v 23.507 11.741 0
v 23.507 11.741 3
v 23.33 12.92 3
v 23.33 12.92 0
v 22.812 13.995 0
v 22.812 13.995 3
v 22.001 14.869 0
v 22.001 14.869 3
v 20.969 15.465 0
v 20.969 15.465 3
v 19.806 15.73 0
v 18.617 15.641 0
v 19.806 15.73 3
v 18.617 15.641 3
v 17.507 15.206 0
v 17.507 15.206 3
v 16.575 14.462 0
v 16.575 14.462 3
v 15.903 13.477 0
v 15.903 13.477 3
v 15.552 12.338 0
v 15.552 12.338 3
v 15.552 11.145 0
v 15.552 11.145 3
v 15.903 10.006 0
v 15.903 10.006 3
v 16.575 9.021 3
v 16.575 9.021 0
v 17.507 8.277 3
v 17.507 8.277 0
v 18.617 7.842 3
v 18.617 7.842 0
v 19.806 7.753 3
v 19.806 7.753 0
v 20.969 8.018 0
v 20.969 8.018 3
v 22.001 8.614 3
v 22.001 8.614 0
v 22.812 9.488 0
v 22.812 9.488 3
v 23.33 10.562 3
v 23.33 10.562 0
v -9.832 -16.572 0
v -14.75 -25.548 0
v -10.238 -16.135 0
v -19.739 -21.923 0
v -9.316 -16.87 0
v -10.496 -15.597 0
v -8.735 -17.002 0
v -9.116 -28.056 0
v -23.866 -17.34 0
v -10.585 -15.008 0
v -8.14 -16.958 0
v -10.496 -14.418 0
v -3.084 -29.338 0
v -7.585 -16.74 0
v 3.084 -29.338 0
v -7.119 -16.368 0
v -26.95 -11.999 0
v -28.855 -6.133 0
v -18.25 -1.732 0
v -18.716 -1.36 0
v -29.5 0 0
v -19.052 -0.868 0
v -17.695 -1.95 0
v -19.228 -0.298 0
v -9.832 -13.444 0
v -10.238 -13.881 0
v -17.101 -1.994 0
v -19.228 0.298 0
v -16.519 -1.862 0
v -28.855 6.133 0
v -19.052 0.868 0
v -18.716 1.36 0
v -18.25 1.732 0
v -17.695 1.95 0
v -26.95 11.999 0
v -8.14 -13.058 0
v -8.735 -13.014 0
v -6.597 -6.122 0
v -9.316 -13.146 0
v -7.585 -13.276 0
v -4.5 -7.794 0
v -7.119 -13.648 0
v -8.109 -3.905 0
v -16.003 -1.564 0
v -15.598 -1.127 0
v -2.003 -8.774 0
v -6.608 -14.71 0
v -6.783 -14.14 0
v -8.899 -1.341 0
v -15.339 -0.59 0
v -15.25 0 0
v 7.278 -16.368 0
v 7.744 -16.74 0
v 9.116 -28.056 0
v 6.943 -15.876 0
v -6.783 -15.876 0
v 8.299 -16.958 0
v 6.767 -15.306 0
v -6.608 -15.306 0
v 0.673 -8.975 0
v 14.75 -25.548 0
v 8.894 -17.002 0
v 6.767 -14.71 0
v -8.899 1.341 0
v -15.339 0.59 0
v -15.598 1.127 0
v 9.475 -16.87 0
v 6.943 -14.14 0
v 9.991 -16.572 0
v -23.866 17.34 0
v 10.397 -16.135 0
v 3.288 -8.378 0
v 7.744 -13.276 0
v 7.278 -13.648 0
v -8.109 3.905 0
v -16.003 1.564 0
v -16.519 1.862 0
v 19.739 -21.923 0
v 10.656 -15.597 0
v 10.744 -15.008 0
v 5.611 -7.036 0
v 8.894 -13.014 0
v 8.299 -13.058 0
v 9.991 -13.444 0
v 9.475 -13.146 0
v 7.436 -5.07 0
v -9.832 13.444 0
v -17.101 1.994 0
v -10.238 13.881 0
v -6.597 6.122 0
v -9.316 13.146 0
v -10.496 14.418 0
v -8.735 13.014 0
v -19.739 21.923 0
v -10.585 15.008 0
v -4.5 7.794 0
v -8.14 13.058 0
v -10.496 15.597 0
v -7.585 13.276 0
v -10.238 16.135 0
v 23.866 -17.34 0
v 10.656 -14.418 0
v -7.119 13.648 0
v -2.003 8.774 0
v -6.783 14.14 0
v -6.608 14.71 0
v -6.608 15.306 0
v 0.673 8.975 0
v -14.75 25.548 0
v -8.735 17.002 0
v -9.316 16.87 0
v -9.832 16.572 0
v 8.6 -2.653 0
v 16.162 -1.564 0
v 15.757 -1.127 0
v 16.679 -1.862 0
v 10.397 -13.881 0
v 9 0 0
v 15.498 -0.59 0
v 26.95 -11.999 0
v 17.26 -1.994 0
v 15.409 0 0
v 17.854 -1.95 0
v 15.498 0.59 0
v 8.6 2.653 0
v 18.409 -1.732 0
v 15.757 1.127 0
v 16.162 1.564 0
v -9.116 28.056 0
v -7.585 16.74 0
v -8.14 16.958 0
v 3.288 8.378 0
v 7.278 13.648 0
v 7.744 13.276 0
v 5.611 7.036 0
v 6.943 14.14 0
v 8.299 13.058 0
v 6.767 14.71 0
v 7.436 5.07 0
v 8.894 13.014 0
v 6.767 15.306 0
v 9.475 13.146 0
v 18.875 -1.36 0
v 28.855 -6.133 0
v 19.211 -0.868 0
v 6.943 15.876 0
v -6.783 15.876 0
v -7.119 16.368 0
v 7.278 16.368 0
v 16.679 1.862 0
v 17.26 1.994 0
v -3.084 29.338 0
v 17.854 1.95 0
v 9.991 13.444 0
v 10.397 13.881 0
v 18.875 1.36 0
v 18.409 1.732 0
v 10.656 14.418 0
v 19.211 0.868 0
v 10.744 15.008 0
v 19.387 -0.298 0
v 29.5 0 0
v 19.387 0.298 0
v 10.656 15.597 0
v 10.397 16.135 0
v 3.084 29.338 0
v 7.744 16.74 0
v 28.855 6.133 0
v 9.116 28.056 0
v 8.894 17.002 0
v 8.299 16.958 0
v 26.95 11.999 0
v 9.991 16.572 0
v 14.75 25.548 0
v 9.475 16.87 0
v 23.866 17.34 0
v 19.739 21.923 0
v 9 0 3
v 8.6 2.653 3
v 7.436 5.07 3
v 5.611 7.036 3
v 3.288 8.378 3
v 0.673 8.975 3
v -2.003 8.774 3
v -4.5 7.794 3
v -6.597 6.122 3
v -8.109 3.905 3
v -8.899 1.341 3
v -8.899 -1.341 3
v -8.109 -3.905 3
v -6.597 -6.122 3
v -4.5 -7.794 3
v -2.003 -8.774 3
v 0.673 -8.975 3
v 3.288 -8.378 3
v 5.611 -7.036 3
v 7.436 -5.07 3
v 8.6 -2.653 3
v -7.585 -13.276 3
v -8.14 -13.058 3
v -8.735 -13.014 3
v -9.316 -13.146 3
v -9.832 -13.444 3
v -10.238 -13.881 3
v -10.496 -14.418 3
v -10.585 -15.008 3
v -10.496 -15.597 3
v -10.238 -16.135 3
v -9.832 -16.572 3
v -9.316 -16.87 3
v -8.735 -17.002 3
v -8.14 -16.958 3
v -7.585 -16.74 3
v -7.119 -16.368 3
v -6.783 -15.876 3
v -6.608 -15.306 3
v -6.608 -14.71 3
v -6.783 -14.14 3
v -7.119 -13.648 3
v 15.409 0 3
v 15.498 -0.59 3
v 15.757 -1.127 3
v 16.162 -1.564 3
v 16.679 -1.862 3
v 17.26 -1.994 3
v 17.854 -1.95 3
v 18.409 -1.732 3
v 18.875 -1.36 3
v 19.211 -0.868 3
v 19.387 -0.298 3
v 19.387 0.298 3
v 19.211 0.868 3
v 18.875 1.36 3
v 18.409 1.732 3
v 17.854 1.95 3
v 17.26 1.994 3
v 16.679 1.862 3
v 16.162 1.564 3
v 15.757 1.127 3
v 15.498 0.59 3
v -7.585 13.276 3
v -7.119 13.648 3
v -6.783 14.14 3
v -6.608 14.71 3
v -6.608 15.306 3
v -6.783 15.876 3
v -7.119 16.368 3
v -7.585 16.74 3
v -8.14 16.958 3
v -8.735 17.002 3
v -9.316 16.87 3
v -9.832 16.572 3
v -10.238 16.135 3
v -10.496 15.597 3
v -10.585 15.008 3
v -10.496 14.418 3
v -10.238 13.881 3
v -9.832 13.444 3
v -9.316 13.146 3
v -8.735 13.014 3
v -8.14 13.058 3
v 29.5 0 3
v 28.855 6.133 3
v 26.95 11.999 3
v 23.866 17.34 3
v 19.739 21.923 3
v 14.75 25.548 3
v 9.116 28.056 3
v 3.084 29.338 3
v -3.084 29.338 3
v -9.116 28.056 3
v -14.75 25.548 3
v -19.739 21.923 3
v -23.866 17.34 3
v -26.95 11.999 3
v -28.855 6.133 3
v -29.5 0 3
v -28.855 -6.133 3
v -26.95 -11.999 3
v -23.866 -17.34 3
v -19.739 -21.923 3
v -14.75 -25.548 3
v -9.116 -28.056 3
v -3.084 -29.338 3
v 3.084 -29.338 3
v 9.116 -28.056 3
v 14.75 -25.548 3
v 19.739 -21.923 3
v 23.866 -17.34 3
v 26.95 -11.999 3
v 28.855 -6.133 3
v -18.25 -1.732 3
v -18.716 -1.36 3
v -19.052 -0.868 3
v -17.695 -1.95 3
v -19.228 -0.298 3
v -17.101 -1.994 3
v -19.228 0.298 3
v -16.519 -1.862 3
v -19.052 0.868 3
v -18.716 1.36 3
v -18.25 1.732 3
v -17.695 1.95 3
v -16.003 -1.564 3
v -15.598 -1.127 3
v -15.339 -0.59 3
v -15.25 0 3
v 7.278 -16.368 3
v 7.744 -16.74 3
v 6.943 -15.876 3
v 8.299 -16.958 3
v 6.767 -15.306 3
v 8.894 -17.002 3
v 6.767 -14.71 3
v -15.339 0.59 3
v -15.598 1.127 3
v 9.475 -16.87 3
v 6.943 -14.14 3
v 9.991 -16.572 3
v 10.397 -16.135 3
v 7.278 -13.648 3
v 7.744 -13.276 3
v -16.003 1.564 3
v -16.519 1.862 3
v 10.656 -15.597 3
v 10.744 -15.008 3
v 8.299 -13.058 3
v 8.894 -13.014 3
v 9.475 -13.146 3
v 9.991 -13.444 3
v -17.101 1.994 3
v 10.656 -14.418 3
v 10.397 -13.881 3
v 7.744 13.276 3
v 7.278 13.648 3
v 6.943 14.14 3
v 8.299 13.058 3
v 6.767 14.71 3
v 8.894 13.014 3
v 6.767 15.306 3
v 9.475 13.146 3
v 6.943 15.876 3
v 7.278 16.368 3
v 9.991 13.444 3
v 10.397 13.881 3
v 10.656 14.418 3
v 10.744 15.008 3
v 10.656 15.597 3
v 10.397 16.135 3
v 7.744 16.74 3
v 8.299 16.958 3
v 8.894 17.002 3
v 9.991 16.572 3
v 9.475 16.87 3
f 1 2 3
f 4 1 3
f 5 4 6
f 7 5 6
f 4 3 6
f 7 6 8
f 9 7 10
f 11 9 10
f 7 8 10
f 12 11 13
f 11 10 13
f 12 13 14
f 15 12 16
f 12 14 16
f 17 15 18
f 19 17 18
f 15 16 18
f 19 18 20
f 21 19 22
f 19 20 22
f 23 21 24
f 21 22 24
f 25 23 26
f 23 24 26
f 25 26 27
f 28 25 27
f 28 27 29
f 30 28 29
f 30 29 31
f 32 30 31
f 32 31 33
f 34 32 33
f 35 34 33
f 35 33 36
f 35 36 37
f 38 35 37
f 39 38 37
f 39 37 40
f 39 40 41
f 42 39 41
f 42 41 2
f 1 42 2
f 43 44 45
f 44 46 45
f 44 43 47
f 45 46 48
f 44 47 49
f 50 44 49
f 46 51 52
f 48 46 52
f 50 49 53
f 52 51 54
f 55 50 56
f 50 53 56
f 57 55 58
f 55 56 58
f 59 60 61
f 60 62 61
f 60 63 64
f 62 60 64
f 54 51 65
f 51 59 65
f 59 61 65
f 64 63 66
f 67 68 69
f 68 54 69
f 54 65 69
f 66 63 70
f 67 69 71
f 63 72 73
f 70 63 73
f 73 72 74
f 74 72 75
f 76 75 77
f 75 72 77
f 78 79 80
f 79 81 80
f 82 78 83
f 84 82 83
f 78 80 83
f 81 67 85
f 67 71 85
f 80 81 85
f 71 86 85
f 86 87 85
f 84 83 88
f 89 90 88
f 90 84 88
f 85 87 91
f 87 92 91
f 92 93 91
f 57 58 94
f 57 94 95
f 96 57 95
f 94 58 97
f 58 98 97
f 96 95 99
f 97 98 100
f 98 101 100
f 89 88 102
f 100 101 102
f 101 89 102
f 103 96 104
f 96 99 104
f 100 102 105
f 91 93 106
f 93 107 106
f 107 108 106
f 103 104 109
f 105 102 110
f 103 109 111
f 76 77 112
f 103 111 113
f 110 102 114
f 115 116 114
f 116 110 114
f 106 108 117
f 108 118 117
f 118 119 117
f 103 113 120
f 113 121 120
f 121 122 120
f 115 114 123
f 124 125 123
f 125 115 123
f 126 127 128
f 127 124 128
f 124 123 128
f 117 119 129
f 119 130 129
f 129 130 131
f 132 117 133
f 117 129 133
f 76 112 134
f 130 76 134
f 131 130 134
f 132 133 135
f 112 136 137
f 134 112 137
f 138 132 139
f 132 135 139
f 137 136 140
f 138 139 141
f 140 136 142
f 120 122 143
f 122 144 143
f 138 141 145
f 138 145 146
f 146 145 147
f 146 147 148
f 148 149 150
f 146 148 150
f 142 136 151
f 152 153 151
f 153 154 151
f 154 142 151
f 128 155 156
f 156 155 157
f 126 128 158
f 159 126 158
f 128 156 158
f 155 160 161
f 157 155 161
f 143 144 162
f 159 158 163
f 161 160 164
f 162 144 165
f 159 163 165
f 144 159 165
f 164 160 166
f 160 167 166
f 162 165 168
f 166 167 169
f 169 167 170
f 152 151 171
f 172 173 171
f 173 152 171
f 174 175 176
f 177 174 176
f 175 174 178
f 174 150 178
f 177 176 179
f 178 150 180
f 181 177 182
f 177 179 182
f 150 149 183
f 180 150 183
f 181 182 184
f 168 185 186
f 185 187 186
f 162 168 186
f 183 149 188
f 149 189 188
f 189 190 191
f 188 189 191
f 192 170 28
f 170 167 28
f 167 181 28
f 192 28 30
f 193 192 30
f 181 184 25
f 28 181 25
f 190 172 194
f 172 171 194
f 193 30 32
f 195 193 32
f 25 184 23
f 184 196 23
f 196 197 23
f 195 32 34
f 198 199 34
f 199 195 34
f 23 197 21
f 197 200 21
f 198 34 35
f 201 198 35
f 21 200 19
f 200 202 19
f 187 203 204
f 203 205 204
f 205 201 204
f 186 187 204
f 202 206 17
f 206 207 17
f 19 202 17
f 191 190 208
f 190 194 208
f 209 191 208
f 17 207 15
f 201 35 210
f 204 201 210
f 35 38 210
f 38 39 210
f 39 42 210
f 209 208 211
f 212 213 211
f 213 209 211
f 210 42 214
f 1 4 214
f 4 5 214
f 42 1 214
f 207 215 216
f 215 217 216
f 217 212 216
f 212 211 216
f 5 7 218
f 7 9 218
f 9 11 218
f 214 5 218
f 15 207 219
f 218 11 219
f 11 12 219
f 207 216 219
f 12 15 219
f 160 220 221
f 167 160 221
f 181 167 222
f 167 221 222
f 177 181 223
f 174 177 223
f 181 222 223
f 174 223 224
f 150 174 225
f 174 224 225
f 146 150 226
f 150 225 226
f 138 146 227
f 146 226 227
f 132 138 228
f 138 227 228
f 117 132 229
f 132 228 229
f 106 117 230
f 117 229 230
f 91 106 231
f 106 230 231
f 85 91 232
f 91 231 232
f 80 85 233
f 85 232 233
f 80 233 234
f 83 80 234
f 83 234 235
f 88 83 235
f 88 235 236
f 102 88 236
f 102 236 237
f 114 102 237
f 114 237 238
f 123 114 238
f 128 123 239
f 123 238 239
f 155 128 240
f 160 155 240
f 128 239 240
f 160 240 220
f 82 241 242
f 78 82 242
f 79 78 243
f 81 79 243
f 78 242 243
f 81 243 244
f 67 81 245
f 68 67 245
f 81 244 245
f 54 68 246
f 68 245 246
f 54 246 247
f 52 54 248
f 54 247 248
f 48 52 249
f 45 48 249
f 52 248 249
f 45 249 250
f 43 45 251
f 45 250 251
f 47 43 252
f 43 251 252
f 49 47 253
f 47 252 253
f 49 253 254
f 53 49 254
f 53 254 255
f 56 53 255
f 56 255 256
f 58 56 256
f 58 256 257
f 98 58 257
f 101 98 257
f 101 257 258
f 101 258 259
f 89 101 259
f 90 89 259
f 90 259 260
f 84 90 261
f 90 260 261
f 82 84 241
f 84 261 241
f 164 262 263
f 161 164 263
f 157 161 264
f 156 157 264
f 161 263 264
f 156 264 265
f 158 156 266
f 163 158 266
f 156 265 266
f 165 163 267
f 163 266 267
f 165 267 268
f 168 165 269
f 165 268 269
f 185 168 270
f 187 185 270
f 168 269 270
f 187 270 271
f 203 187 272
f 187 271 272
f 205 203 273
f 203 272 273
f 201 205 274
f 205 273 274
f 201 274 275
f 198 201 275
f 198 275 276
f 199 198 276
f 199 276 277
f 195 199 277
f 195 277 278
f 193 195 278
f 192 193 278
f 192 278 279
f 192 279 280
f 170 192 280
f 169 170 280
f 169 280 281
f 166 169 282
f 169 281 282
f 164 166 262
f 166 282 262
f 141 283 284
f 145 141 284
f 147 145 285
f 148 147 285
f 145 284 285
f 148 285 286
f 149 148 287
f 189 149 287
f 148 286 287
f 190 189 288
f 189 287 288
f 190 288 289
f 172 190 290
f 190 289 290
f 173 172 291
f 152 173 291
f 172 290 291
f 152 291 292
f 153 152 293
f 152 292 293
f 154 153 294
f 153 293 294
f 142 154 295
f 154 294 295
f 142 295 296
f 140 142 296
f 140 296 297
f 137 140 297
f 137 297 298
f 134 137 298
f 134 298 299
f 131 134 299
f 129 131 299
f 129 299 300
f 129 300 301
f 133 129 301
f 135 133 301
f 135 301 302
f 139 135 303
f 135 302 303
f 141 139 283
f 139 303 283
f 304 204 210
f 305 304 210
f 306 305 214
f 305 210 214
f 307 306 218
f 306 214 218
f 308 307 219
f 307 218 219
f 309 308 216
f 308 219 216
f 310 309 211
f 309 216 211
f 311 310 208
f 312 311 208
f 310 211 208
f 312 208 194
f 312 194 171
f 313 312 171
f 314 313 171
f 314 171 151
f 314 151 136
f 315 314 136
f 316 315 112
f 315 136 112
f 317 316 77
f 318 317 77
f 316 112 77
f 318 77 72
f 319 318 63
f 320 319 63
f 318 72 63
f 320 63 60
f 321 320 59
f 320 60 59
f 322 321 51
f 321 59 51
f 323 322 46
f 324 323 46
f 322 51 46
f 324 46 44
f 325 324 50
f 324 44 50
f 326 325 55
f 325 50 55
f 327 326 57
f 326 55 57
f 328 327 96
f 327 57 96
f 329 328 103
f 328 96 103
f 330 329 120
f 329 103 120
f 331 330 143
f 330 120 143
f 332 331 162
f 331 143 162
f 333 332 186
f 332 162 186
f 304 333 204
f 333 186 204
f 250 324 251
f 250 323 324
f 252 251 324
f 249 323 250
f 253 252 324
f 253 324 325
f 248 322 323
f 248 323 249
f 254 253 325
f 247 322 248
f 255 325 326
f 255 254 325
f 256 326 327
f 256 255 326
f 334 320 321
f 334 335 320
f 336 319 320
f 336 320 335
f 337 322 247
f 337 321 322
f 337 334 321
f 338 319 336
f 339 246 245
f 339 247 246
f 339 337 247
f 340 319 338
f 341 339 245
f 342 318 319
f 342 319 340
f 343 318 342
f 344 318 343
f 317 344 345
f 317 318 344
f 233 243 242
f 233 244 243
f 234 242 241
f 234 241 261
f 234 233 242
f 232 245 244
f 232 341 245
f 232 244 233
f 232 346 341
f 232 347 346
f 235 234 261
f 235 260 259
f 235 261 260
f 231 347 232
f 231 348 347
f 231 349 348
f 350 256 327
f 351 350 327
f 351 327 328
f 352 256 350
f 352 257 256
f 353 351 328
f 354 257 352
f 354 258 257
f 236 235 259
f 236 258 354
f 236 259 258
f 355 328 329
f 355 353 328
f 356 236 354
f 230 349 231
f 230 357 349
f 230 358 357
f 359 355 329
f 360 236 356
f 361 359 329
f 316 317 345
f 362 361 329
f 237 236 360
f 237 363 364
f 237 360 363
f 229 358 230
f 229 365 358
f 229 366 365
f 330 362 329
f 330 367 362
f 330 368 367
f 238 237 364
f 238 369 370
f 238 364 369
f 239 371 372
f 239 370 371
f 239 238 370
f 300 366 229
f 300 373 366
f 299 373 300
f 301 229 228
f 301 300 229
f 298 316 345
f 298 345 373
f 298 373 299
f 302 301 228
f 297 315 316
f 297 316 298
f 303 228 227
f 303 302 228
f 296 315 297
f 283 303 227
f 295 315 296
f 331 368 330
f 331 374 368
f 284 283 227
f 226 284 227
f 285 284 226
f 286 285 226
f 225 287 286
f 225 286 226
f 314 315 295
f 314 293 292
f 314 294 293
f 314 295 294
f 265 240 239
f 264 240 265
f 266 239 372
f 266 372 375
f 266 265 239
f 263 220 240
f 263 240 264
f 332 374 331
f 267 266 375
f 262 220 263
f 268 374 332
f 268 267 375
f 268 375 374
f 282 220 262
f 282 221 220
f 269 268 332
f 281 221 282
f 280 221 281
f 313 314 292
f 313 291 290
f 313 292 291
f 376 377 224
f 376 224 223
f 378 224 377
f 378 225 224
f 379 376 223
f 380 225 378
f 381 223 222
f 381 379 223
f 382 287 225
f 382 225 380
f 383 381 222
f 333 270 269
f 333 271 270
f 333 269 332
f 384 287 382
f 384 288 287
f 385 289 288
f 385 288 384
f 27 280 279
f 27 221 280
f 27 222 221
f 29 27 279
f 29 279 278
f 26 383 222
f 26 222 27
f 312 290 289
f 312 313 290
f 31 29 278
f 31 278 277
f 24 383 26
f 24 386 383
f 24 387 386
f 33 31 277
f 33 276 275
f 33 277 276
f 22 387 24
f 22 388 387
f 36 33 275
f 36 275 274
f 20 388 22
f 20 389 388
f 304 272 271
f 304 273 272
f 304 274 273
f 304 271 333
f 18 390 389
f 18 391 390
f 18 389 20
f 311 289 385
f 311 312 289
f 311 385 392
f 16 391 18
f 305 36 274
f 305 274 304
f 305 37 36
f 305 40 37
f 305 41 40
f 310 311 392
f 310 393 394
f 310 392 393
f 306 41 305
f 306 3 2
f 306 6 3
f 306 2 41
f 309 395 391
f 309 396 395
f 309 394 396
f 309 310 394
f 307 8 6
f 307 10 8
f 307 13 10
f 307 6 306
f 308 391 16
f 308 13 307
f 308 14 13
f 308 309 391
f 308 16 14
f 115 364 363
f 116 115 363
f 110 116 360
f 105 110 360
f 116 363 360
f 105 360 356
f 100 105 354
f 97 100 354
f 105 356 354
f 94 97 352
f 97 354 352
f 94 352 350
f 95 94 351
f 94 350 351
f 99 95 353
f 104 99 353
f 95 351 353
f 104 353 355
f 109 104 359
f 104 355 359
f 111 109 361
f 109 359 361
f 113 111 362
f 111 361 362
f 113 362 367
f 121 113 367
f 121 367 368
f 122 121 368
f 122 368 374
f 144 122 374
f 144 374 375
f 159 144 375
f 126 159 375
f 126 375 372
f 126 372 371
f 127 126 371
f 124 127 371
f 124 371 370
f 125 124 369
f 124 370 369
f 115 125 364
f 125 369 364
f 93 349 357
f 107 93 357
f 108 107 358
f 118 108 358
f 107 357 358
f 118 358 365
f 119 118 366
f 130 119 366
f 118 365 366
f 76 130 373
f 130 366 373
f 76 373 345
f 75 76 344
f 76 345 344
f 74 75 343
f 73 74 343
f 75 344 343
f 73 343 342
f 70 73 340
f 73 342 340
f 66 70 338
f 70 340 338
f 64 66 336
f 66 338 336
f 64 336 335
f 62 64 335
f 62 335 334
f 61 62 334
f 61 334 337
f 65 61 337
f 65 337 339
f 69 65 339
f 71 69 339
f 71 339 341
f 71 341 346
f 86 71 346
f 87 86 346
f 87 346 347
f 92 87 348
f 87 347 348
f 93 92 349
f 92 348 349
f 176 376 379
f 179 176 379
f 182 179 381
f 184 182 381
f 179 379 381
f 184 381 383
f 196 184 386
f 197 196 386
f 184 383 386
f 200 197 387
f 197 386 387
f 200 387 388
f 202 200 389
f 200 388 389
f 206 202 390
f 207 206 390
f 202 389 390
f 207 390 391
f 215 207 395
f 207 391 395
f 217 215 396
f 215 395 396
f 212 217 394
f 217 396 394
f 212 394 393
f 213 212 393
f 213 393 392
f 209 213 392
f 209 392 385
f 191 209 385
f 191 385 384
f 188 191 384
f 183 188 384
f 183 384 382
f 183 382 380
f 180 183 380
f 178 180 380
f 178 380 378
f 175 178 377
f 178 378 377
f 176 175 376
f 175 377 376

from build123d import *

# Parameters (mm, degrees)
SKETCH_2_R               = 29.5
EXTRUDE_1_DEPTH          = 3
SKETCH_3_R               = 2
CUT_EXTRUDE_1_DEPTH      = 3
PATTERN_CIRCULAR_1_COUNT = 6
SKETCH_4_R               = 9
CUT_EXTRUDE_2_DEPTH      = 3
SKETCH_5_R               = 4
CUT_EXTRUDE_3_DEPTH      = 10


with BuildPart() as part:
    # 草图2 → 凸台-拉伸1 (new body)
    with BuildSketch(Plane.XY):
        Circle(SKETCH_2_R)
    extrude(amount=EXTRUDE_1_DEPTH)

    # 草图3 → 切除-拉伸1 (cut)
    with BuildSketch(Plane.XY.offset(3)):
        with Locations((-17.25, 0)):
            Circle(SKETCH_3_R)
    cut_extrude_1 = extrude(amount=-CUT_EXTRUDE_1_DEPTH, mode=Mode.SUBTRACT)

    # 阵列(圆周)1: 切除-拉伸1 ×6 about axis
    pattern_circular_1_axis = Axis((0.07965368, 0, 0), (0, 0, 1))
    for i in range(1, PATTERN_CIRCULAR_1_COUNT):
        add(cut_extrude_1.rotate(pattern_circular_1_axis, i * 360 / PATTERN_CIRCULAR_1_COUNT), mode=Mode.SUBTRACT)

    # 草图4 → 切除-拉伸2 (cut)
    with BuildSketch(Plane.XY.offset(3)):
        Circle(SKETCH_4_R)
    extrude(amount=-CUT_EXTRUDE_2_DEPTH, mode=Mode.SUBTRACT)

    # 草图5 → 切除-拉伸3 (cut)
    with BuildSketch(Plane.XY.offset(3)):
        with Locations((19.507246774, 11.74145424)):
            Circle(SKETCH_5_R)
    extrude(amount=-CUT_EXTRUDE_3_DEPTH, mode=Mode.SUBTRACT)


solid = part.part
